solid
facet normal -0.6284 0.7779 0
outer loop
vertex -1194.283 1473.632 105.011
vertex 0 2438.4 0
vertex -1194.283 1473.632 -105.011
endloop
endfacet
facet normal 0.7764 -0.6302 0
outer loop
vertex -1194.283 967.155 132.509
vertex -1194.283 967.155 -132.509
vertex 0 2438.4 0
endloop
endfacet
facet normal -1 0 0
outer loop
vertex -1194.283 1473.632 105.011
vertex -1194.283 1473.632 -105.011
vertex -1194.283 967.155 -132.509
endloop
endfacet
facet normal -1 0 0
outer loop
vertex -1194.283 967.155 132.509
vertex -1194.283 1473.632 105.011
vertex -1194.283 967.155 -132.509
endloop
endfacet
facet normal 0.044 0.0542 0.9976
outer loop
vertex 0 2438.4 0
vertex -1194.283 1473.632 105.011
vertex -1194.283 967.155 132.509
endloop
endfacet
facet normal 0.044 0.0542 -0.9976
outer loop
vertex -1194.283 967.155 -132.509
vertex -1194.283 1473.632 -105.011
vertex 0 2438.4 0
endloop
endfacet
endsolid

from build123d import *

# Parameters (mm, degrees)
BOSS_EXTRUDE1_DEPTH      = 508
BOSS_EXTRUDE1_DEPTH_BACK = 508
CUT_EXTRUDE2_DEPTH       = 1961.143295518
CUT_EXTRUDE2_DEPTH_BACK  = 1961.143295518
CUT_EXTRUDE7_DEPTH       = 2719.400028326
CUT_EXTRUDE7_DEPTH_BACK  = 2719.400028326


with BuildPart() as part:
    # Sketch1 → Boss-Extrude1 (new, two sides: drawn at the far end of the back side and taken through both)
    with BuildSketch(Plane(origin=(0, 0, 0), x_dir=(0, 1, 0), z_dir=(0, 0, 1)).offset(-BOSS_EXTRUDE1_DEPTH_BACK)):
        Polygon((0, 0), (1219.2, 989.685264987), (2438.4, 0), (1473.631984251, 1194.282750762), (964.768015749, 1194.282750762), align=None)
    extrude(amount=BOSS_EXTRUDE1_DEPTH + BOSS_EXTRUDE1_DEPTH_BACK)

    # Sketch2 → Cut-Extrude2 (cut, two sides: drawn at the far end of the back side and taken through both)
    with BuildSketch(Plane(origin=(-1193.155493259, 968.543643797, 0), x_dir=(0.6302416824749717, 0.7763990093187376, 0), z_dir=(0.7763990093187376, -0.6302416824749717, 0)).offset(-CUT_EXTRUDE2_DEPTH_BACK)):
        Polygon((1893.171344323, -508), (1893.171344323, 0), (-138.828655677, -142.091281869), (-138.828655677, -508), align=None)
        Polygon((-138.828655677, 142.091281869), (1893.171344323, 0), (1893.171344323, 508), (-138.828655677, 508), align=None)
    extrude(amount=CUT_EXTRUDE2_DEPTH + CUT_EXTRUDE2_DEPTH_BACK, mode=Mode.SUBTRACT)

    # Sketch5 → Cut-Extrude7 (cut, two sides: drawn at the far end of the back side and taken through both)
    with BuildSketch(Plane(origin=(0, 0, 0), x_dir=(0, 1, 0), z_dir=(0, 0, 1)).offset(-CUT_EXTRUDE7_DEPTH_BACK)):
        Polygon((2438.4, 0), (965.713353388, 1195.452980721), (0, 0), align=None)
    extrude(amount=CUT_EXTRUDE7_DEPTH + CUT_EXTRUDE7_DEPTH_BACK, mode=Mode.SUBTRACT)


solid = part.part
